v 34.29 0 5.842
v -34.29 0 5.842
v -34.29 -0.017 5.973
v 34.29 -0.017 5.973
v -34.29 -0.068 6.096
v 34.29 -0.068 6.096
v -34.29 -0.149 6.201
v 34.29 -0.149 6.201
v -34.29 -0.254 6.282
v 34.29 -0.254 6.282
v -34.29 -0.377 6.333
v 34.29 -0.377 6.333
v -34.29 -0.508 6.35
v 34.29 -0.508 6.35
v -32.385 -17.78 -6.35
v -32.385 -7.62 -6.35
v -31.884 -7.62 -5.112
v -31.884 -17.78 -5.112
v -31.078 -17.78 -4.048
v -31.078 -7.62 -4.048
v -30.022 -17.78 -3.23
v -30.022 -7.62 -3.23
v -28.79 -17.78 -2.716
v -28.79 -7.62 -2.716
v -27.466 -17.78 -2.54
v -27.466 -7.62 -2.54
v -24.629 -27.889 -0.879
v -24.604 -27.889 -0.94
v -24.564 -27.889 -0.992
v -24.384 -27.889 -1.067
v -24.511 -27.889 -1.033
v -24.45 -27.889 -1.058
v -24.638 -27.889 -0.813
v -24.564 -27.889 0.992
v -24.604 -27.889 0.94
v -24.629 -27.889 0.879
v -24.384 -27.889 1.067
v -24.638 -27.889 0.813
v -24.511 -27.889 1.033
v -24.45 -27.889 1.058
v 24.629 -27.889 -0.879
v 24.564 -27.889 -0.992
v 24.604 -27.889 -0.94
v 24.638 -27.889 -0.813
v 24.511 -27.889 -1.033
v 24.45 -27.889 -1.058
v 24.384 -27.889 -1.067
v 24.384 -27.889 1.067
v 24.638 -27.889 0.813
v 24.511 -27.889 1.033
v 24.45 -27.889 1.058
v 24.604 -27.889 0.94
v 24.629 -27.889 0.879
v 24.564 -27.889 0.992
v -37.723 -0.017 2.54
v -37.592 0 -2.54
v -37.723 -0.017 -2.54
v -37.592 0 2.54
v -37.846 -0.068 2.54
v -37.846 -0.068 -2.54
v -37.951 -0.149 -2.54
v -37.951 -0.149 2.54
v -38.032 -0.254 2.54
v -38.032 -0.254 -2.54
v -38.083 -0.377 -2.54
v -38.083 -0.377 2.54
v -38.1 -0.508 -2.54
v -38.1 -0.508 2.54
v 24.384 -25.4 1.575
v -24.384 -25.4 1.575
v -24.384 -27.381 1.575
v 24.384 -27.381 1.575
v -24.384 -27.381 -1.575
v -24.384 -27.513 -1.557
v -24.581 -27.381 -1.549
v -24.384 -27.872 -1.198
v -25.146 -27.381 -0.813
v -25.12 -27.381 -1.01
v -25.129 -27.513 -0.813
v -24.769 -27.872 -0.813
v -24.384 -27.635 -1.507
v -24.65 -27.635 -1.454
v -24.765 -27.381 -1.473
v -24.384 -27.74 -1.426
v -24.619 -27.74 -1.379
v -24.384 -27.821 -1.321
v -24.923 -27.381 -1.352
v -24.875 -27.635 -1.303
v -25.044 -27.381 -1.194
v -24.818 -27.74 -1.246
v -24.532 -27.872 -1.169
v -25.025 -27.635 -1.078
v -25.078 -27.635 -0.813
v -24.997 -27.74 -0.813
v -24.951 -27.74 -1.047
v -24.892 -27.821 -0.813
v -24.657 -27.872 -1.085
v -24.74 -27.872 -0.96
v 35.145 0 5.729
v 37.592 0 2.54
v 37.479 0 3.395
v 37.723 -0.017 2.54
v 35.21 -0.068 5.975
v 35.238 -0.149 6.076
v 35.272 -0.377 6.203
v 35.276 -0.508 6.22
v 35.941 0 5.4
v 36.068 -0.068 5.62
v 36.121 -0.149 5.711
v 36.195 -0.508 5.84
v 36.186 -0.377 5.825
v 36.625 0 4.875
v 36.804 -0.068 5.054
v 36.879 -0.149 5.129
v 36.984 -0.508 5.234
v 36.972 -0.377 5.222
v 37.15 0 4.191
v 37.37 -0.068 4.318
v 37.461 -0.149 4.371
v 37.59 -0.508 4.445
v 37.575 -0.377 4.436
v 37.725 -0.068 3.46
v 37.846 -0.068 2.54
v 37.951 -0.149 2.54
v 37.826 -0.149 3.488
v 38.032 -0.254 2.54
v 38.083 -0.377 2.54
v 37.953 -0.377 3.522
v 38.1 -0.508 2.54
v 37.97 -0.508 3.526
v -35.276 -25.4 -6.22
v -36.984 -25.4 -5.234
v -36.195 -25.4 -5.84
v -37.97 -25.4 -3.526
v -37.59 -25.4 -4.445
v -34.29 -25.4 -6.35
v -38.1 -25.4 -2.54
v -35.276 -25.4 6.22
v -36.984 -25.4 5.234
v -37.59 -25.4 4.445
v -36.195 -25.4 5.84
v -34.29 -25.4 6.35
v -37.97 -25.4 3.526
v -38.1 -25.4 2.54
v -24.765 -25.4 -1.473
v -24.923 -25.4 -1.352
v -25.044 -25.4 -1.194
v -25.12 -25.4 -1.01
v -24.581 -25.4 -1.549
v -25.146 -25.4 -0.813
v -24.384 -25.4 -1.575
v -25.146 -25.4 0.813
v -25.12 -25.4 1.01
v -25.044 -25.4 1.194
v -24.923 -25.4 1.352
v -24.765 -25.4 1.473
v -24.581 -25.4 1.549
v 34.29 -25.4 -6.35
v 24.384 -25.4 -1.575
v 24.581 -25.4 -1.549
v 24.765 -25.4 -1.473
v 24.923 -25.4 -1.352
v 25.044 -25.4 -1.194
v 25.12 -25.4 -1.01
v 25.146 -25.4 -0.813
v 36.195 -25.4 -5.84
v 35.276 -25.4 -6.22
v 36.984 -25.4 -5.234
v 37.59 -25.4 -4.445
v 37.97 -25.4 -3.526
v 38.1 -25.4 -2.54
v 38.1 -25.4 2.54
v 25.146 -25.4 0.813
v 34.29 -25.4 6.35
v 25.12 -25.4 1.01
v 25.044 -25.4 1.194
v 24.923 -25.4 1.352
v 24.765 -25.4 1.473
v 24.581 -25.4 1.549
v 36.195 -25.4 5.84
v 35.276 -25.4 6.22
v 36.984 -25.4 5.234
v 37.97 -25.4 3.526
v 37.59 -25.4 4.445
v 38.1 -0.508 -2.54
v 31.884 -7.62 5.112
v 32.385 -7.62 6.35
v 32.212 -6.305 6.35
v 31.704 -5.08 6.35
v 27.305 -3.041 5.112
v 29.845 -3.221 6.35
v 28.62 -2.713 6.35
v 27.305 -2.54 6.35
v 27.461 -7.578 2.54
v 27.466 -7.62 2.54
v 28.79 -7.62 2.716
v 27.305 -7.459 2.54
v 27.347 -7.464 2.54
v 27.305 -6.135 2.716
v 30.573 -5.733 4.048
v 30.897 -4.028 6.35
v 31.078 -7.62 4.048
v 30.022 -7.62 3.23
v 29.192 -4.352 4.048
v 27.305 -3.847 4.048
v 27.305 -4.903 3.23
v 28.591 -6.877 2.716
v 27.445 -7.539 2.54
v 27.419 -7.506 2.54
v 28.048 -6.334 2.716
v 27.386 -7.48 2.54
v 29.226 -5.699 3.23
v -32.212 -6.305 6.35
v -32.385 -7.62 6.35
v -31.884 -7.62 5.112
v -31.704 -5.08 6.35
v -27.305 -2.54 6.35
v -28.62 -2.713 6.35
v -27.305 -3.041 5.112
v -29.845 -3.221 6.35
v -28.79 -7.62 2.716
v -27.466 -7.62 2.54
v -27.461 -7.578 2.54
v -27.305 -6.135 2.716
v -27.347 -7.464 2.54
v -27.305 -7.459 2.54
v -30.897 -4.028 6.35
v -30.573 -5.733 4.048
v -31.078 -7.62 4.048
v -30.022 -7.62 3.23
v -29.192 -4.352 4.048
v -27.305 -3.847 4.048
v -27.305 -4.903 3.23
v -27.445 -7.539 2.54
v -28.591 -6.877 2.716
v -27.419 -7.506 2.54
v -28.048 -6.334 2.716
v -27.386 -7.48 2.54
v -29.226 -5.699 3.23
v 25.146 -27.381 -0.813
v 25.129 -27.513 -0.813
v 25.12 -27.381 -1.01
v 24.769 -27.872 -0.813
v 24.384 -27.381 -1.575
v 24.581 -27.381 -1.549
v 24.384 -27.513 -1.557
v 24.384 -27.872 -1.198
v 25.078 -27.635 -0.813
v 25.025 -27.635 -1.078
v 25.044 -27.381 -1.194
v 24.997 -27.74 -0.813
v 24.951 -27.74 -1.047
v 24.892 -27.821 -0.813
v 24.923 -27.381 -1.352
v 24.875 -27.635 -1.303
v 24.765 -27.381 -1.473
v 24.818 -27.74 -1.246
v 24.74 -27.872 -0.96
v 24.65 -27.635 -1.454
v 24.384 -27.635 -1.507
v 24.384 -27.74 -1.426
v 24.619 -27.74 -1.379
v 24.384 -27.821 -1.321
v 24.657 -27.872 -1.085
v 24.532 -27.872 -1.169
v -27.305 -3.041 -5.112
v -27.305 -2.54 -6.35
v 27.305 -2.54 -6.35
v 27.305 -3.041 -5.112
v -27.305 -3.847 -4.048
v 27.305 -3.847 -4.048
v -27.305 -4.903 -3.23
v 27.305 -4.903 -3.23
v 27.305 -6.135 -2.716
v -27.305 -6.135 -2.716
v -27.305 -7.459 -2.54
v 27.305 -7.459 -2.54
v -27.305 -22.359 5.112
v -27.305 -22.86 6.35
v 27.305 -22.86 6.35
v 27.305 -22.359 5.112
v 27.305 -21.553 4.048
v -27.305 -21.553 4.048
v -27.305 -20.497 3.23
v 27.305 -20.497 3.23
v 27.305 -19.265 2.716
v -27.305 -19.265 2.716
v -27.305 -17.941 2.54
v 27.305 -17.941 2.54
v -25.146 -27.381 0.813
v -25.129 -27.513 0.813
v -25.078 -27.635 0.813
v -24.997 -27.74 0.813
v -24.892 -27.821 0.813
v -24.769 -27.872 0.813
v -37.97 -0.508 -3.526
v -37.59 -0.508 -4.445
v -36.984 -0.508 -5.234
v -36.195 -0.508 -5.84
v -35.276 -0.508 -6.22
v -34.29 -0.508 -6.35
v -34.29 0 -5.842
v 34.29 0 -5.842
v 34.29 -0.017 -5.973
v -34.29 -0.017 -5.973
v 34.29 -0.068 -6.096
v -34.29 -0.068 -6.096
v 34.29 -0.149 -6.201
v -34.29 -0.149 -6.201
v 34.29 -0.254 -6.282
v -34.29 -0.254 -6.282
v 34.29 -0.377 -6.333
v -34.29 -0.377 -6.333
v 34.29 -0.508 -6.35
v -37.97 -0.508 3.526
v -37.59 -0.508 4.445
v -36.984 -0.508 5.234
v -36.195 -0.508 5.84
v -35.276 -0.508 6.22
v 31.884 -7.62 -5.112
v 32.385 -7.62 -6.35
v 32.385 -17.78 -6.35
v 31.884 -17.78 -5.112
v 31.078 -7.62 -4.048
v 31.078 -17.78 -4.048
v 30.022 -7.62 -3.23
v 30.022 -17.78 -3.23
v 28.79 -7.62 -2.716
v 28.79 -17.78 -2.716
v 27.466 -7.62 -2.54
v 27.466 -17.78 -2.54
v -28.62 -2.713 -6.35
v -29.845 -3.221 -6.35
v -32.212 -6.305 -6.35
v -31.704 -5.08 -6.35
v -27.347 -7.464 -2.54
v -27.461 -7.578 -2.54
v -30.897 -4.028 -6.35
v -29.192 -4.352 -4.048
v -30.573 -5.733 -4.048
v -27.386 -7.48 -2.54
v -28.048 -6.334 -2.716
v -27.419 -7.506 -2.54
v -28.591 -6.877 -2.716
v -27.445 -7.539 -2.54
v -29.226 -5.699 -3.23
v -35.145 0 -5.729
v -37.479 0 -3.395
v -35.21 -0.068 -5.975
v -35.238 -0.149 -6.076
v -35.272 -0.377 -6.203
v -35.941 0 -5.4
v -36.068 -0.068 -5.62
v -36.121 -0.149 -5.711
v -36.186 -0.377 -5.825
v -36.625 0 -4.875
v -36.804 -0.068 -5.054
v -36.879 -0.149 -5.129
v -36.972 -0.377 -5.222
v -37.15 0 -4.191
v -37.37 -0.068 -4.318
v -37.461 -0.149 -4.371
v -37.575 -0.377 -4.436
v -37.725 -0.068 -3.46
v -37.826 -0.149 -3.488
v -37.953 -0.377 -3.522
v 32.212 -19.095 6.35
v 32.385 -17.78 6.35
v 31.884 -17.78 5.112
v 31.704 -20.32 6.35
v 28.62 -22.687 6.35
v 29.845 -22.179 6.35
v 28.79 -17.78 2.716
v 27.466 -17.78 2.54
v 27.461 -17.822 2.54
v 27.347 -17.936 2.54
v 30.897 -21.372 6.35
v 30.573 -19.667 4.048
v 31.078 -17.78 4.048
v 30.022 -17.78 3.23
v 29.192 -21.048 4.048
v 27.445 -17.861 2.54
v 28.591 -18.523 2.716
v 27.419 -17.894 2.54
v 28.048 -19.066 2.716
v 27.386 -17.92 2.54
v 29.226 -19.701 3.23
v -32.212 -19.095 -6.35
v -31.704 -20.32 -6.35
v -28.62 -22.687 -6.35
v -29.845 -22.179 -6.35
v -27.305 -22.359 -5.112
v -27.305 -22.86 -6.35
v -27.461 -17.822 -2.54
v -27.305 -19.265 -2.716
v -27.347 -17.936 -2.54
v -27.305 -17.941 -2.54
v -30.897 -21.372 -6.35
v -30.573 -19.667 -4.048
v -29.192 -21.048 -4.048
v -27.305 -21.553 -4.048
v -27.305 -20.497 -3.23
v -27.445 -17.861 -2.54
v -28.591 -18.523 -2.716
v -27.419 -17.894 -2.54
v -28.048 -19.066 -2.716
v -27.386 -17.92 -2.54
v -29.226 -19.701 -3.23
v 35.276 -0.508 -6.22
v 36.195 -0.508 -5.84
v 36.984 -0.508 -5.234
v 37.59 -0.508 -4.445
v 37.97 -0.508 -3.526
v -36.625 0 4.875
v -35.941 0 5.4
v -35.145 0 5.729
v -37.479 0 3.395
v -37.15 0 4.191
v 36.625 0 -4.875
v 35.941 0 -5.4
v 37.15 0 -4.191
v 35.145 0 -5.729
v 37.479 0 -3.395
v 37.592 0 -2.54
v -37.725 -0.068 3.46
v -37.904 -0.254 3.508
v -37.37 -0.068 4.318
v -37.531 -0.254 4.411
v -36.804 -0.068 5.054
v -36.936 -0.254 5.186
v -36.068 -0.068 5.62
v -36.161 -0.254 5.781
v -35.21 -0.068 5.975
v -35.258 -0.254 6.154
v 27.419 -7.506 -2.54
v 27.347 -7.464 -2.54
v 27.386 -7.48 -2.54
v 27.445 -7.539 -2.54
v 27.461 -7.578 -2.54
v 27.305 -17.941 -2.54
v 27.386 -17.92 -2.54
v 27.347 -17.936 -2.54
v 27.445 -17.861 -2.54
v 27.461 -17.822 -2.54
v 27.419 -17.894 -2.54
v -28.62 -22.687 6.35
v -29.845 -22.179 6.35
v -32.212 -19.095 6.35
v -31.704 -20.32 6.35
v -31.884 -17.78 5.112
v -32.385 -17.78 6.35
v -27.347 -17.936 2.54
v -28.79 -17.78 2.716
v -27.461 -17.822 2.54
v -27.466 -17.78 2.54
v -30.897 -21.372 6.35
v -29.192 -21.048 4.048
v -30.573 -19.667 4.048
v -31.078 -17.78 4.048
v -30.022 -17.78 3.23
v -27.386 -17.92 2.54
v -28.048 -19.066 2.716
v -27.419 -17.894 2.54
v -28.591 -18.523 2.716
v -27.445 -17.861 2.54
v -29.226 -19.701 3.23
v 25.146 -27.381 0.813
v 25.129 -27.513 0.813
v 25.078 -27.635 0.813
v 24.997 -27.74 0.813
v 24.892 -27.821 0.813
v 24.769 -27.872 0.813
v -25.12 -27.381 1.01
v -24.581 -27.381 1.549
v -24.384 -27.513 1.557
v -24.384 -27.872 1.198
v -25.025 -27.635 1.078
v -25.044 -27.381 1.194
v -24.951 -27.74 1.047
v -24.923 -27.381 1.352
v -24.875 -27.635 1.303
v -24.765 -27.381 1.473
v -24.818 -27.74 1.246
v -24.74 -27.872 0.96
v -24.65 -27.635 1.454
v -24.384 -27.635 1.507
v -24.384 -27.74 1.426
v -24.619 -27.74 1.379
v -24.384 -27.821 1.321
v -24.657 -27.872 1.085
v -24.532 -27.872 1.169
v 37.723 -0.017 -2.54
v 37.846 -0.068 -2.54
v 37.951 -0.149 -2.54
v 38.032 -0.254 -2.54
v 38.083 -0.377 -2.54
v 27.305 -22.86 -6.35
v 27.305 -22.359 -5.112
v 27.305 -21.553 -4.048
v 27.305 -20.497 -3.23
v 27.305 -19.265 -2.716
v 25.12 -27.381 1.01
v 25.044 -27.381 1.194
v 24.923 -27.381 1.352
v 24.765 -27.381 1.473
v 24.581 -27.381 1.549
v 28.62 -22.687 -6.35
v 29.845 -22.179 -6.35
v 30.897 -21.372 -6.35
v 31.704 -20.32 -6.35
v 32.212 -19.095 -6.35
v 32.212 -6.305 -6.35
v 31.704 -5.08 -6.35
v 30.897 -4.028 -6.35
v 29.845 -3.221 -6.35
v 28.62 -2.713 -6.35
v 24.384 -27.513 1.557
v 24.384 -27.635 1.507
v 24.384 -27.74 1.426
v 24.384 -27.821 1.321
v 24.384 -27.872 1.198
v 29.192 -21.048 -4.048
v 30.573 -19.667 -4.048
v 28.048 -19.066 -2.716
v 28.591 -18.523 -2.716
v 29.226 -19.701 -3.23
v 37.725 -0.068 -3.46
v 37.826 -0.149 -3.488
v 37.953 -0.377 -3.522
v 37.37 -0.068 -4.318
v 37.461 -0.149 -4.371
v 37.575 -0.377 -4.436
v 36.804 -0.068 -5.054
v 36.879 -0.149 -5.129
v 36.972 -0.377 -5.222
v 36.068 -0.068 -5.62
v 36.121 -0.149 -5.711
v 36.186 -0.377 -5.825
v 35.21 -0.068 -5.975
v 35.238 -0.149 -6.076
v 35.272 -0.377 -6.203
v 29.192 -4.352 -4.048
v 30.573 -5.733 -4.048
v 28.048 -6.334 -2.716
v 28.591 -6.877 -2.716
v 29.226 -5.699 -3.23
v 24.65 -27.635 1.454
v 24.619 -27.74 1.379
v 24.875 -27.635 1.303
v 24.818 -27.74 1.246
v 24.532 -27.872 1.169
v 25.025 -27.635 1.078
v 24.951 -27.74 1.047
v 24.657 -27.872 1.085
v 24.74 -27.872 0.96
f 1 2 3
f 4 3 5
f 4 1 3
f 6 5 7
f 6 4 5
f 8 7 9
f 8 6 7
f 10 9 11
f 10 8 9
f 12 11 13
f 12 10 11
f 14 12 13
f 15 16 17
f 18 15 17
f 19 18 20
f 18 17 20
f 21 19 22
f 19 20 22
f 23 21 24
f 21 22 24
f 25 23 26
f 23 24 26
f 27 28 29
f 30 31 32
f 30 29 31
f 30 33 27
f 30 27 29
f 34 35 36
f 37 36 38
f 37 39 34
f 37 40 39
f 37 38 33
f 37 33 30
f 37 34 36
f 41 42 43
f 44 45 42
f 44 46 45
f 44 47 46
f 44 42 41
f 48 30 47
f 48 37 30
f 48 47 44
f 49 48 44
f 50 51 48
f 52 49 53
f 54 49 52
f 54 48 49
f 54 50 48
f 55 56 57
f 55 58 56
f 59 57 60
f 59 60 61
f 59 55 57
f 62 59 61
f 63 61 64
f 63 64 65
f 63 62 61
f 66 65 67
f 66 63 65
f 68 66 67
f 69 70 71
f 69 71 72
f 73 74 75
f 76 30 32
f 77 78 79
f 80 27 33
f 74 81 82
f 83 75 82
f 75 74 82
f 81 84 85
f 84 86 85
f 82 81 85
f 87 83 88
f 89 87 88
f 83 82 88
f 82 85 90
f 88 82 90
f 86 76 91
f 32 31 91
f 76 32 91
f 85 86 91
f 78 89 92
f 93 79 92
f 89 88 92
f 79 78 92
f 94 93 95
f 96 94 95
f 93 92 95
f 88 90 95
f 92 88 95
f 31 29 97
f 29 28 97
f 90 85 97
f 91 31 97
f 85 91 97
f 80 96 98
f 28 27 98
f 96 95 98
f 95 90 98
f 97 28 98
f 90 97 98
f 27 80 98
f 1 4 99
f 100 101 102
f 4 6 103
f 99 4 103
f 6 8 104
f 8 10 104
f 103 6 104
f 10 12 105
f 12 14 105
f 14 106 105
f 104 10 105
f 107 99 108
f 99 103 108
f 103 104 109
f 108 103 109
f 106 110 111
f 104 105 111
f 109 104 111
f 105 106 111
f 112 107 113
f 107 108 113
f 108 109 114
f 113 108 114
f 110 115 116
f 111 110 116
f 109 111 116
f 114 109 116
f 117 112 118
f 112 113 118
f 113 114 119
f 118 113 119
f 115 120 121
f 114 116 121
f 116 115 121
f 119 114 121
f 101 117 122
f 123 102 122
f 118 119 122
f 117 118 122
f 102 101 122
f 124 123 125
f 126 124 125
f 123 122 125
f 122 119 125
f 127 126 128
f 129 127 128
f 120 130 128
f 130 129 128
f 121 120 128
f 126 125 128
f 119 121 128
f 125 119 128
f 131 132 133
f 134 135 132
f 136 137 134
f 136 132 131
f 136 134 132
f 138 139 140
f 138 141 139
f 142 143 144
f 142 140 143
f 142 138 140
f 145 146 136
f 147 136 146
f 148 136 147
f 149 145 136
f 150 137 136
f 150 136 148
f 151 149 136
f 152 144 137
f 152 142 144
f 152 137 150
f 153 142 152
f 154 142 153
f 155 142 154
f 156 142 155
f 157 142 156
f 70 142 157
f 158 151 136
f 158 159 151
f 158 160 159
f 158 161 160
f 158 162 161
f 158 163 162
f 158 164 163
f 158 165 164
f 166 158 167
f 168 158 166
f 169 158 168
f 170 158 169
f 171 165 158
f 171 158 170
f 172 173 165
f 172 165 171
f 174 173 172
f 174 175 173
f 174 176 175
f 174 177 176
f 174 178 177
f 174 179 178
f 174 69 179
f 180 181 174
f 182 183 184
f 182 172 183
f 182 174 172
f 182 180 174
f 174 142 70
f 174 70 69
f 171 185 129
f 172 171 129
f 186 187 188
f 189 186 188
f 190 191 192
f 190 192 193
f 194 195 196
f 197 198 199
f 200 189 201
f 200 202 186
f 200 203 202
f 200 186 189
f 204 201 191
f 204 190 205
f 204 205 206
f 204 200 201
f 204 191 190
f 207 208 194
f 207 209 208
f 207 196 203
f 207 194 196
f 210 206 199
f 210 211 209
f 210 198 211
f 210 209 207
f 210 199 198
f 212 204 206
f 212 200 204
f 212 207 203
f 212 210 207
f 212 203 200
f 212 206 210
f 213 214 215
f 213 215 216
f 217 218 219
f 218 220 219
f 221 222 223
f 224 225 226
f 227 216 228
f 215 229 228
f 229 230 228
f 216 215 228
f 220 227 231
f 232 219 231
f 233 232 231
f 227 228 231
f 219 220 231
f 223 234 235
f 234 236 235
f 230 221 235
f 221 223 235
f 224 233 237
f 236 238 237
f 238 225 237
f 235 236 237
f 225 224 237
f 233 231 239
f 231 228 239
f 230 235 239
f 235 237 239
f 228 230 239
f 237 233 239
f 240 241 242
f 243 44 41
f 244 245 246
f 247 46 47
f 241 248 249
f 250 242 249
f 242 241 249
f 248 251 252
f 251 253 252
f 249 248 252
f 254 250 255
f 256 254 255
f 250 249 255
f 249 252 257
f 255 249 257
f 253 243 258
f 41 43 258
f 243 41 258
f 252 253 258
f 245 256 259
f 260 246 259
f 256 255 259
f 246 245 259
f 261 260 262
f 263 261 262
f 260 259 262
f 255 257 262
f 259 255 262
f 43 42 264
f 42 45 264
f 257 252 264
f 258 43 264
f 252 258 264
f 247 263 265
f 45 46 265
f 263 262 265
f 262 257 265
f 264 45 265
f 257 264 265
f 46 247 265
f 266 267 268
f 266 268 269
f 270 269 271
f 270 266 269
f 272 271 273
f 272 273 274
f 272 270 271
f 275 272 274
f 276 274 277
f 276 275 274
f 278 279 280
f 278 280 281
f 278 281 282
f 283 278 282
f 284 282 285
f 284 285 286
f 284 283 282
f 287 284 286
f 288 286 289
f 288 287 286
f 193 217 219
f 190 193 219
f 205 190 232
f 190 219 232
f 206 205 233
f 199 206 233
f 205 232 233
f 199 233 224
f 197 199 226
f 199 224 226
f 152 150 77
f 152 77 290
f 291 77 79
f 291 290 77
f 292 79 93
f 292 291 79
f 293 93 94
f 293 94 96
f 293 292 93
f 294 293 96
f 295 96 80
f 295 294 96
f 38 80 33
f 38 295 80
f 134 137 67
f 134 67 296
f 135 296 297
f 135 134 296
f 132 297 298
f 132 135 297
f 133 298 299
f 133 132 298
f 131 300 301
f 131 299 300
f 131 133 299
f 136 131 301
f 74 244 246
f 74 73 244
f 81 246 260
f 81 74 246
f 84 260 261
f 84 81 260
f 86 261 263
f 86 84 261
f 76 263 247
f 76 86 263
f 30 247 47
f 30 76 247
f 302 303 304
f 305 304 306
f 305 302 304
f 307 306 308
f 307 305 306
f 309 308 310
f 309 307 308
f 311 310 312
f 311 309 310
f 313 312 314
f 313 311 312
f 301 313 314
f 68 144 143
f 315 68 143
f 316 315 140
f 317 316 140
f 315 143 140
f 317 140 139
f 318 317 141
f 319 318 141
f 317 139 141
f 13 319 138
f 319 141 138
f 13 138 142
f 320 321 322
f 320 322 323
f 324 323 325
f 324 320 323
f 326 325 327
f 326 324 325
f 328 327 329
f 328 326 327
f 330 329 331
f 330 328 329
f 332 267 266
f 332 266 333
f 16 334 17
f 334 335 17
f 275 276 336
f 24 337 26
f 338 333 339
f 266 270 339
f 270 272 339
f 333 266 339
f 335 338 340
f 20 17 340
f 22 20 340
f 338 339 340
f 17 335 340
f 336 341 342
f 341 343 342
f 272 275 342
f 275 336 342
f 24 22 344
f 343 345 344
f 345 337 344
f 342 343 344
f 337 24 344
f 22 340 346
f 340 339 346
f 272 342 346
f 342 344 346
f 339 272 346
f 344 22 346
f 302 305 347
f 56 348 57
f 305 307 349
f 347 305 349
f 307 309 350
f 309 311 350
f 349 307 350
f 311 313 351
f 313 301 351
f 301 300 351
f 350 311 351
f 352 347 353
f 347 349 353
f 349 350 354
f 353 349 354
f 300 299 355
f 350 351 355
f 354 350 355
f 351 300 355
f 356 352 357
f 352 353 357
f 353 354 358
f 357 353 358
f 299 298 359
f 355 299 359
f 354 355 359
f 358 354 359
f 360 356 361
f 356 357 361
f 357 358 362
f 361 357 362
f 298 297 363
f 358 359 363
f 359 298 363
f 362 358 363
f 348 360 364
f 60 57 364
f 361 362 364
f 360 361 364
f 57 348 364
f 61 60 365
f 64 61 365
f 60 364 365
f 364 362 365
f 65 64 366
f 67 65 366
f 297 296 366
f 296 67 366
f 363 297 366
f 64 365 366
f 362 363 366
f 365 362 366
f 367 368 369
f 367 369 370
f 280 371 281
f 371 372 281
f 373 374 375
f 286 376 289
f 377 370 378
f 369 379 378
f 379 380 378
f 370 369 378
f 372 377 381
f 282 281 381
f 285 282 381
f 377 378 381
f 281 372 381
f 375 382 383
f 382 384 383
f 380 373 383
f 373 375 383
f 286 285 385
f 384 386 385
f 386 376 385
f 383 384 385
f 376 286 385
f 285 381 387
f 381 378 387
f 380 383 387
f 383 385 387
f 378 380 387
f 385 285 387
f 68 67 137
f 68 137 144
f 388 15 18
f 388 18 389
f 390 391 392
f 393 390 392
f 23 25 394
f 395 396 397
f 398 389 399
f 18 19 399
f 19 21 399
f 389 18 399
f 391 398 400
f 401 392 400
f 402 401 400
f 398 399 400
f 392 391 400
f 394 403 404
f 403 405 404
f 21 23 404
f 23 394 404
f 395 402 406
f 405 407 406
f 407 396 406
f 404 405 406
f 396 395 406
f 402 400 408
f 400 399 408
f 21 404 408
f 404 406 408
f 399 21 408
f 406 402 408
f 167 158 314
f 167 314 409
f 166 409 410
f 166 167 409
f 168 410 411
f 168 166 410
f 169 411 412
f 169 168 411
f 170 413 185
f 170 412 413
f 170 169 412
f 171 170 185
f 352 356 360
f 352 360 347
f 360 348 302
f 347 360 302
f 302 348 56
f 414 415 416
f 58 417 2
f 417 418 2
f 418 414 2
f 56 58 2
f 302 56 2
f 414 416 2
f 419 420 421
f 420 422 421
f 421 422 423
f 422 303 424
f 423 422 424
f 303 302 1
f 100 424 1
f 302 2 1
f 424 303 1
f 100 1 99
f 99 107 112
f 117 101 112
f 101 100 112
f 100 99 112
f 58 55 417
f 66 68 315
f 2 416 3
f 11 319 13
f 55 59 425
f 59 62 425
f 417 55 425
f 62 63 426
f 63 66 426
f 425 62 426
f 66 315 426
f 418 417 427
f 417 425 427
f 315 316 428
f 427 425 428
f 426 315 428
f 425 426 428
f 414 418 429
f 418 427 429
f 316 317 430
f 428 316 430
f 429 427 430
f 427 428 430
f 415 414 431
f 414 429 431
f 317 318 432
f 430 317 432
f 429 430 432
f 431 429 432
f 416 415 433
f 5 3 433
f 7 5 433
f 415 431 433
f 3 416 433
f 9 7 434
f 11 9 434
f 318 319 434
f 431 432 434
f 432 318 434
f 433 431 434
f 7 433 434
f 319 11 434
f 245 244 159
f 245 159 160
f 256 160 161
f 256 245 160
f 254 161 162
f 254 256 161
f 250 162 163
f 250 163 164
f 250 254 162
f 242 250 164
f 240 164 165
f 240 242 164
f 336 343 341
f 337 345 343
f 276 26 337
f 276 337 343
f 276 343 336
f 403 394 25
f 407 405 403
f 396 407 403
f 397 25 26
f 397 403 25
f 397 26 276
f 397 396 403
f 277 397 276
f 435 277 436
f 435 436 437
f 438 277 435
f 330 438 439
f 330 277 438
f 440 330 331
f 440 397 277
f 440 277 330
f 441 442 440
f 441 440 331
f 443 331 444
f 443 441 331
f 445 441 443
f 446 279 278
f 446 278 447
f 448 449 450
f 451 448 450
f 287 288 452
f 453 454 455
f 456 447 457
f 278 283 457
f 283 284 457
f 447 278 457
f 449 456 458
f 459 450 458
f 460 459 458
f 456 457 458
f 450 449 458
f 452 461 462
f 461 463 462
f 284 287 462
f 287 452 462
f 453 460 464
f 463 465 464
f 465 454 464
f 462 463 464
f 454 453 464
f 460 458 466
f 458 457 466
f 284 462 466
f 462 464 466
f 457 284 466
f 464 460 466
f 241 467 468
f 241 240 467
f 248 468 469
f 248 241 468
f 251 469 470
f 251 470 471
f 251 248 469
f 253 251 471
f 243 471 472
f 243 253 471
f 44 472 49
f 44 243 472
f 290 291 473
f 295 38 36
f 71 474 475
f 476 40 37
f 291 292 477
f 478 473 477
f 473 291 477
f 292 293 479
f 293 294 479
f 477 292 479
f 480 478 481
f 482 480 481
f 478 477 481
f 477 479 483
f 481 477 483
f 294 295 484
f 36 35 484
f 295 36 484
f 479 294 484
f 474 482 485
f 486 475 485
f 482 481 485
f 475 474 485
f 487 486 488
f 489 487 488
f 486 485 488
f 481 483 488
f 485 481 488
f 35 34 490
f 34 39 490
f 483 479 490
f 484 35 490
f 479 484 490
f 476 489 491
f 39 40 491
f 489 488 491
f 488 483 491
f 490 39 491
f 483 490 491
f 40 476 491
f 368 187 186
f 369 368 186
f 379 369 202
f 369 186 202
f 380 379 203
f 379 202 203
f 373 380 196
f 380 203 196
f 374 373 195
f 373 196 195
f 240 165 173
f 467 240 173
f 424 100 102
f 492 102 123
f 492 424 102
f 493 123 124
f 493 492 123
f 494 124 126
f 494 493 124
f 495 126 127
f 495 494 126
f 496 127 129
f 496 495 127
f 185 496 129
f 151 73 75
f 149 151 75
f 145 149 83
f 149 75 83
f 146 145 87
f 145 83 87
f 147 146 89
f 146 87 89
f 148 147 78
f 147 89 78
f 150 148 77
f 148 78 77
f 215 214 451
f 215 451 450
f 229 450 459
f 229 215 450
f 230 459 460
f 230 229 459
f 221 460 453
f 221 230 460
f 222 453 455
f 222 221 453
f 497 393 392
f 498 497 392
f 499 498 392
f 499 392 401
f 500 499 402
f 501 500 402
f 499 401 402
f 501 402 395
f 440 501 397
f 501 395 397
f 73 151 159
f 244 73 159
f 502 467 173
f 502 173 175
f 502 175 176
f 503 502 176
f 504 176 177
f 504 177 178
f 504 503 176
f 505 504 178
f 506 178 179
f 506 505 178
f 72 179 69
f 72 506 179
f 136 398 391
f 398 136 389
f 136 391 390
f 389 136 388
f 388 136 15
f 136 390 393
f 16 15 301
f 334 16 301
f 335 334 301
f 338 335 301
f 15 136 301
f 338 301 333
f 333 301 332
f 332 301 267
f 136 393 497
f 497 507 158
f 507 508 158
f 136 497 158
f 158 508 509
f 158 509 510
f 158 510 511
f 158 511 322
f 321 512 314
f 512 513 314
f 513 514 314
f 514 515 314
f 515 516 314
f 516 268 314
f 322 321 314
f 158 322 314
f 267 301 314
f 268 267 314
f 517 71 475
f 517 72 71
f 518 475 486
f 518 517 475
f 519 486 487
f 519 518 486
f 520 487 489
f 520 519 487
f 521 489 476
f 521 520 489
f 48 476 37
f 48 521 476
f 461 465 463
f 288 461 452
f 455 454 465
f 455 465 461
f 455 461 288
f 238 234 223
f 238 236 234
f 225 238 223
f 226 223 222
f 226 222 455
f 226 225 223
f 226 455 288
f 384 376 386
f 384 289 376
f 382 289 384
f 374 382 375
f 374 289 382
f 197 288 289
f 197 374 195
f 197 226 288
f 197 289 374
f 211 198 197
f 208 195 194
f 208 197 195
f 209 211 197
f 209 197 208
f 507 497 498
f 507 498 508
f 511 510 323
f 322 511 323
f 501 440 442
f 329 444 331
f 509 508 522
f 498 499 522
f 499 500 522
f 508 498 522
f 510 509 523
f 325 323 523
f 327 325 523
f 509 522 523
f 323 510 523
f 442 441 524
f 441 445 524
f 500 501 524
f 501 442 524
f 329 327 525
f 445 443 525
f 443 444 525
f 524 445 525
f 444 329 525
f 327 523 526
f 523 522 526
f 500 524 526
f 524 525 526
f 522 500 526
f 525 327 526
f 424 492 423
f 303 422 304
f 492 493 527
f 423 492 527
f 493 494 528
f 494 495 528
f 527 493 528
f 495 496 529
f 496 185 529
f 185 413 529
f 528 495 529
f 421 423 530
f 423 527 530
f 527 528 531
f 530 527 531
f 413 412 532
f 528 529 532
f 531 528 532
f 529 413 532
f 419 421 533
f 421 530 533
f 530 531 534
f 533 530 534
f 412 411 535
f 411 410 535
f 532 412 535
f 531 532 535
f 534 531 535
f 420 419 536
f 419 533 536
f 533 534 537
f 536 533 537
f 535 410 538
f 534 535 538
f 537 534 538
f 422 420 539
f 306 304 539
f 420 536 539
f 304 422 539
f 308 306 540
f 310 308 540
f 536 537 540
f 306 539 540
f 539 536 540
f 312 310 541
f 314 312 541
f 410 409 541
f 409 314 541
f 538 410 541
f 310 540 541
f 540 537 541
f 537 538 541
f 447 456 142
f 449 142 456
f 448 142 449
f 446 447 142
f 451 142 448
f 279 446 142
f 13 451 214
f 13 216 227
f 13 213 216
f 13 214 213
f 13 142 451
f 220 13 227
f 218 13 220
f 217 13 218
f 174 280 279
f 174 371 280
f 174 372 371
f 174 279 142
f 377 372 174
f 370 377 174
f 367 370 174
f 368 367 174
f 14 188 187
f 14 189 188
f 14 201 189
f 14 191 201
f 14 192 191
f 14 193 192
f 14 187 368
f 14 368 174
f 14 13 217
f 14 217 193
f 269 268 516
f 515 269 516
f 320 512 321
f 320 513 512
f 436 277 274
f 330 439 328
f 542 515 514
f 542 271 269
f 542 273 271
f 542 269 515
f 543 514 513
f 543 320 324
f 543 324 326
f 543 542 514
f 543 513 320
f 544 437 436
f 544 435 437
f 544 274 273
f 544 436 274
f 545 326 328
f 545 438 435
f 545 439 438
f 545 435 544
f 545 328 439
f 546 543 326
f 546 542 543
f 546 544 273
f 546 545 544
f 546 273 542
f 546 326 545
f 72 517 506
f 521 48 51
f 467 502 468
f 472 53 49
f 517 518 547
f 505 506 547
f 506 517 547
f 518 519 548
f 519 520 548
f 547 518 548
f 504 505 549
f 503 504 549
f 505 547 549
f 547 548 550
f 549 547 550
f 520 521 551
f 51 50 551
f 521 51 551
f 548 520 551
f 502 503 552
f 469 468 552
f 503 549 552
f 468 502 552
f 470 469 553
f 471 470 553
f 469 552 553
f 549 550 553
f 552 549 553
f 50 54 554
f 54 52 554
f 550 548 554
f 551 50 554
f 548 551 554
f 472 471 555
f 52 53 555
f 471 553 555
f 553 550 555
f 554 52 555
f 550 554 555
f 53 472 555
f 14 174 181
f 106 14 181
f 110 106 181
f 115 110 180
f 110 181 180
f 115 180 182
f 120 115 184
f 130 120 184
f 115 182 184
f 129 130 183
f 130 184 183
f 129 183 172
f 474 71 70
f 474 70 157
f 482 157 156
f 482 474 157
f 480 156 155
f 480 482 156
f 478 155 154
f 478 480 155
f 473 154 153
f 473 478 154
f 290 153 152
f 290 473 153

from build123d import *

# Parameters (mm, degrees)
F0_W          = 76.2
F0_H          = 12.7
F1_DEPTH      = 25.4
F2_W          = 50.292
F2_H          = 3.1496
F3_DEPTH      = 2.4892
F4_R          = 0.762
F5_R          = 0.508
F6_R          = 3.81
F7_W          = 64.77
F7_H          = 20.32
F8_DEPTH      = 3.81
F9_R          = 5.08
F10_T1_DEPTH  = 54.61
F10_T3_DEPTH  = 10.16
F10_T6_ANGLE  = 90
F10_T8_ANGLE  = 90
F10_T10_ANGLE = 90
F10_T12_ANGLE = 90
F11_W         = 64.77
F11_H         = 20.32
F12_DEPTH     = 3.81
F13_R         = 5.08
F14_T1_DEPTH  = 54.61
F14_T3_DEPTH  = 10.16
F14_T6_ANGLE  = 90
F14_T8_ANGLE  = 90
F14_T10_ANGLE = 90
F14_T12_ANGLE = 90
F15_R         = 0.508


# Not quite as in the source:
# - a fillet or chamfer that OpenCascade refuses, or shapes differently, is made with other operations: its cross-section is extruded or revolved along the edge and cut away or added


with BuildPart() as f1:
    # F0 (on Front) → F1 (new body)
    with BuildSketch(Plane.XZ):
        Rectangle(F0_W, F0_H)
    extrude(amount=F1_DEPTH)

    # F2 (on face) → F3 (join)
    with BuildSketch(Plane.XZ.offset(25.4)):
        Rectangle(F2_W, F2_H)
    extrude(amount=F3_DEPTH)

    # F4
    f4_edges = [f1.edges().sort_by_distance(p)[0] for p in [
        (-25.146, -26.6446, 1.5748),
        (-25.146, -26.6446, -1.5748),
        (25.146, -26.6446, 1.5748),
        (25.146, -26.6446, -1.5748),
    ]]
    fillet(f4_edges, radius=F4_R)

    # F5
    f5_edges = [f1.edges().sort_by_distance(p)[0] for p in [
        (0, -27.8892, 1.5748),
        (24.922815, -27.8892, 1.351615),
        (-24.922815, -27.8892, 1.351615),
        (25.146, -27.8892, 0),
        (-25.146, -27.8892, 0),
        (24.922815, -27.8892, -1.351615),
        (-24.922815, -27.8892, -1.351615),
        (0, -27.8892, -1.5748),
    ]]
    fillet(f5_edges, radius=F5_R)

    # F6
    f6_edges = [f1.edges().sort_by_distance(p)[0] for p in [
        (38.1, -12.7, 6.35),
        (38.1, -12.7, -6.35),
        (-38.1, -12.7, 6.35),
        (-38.1, -12.7, -6.35),
    ]]
    fillet(f6_edges, radius=F6_R)

    # F7 (on face) → F8 (cut)
    with BuildSketch(Plane.XY.offset(6.35)):
        with Locations((0, -12.7)):
            Rectangle(F7_W, F7_H)
    extrude(amount=-F8_DEPTH, mode=Mode.SUBTRACT)

    # F9
    f9_edges = [f1.edges().sort_by_distance(p)[0] for p in [
        (-32.385, -2.54, 4.445),
        (-32.385, -22.86, 4.445),
        (32.385, -2.54, 4.445),
        (32.385, -22.86, 4.445),
    ]]
    fillet(f9_edges, radius=F9_R)

    # F10: fillet of radius 5.08 on 1 edges, made by hand

    # F10_s2 → F10_t1 (join)
    with BuildSketch(Plane.YZ.offset(-27.305)):
        with BuildLine():
            ThreePointArc((-2.54, 6.35), (-4.3478368763, 3.6039073716), (-7.4586888497, 2.54))
            Line((-7.4586888497, 2.54), (-2.54, 2.54))
            Line((-2.54, 2.54), (-2.54, 6.35))
        make_face()
        with BuildLine():
            ThreePointArc((-22.86, 6.35), (-21.0521631237, 3.6039073716), (-17.9413111503, 2.54))
            Line((-17.9413111503, 2.54), (-22.86, 2.54))
            Line((-22.86, 2.54), (-22.86, 6.35))
        make_face()
    extrude(amount=F10_T1_DEPTH)

    # F10_s4 → F10_t3 (join)
    with BuildSketch(Plane.XZ.offset(7.62)):
        with BuildLine():
            ThreePointArc((-32.385, 6.35), (-30.5771631237, 3.6039073716), (-27.4663111503, 2.54))
            Line((-27.4663111503, 2.54), (-32.385, 2.54))
            Line((-32.385, 2.54), (-32.385, 6.35))
        make_face()
        with BuildLine():
            ThreePointArc((32.385, 6.35), (30.5771631237, 3.6039073716), (27.4663111503, 2.54))
            Line((27.4663111503, 2.54), (32.385, 2.54))
            Line((32.385, 2.54), (32.385, 6.35))
        make_face()
    extrude(amount=F10_T3_DEPTH)

    # F10_s5 → F10_t6 (revolve)
    with BuildSketch(Plane.XZ.offset(7.62)):
        with BuildLine():
            ThreePointArc((32.385, 6.35), (30.5771631237, 3.6039073716), (27.4663111503, 2.54))
            Line((27.4663111503, 2.54), (32.385, 2.54))
            Line((32.385, 2.54), (32.385, 6.35))
        make_face()
    revolve(axis=Axis((27.305, -7.62, 2.54), (0, 0, 1)), revolution_arc=F10_T6_ANGLE)

    # F10_s7 → F10_t8 (revolve)
    with BuildSketch(Plane.XZ.offset(7.62)):
        with BuildLine():
            ThreePointArc((-32.385, 6.35), (-30.5771631237, 3.6039073716), (-27.4663111503, 2.54))
            Line((-27.4663111503, 2.54), (-32.385, 2.54))
            Line((-32.385, 2.54), (-32.385, 6.35))
        make_face()
    revolve(axis=Axis((-27.305, -7.62, 2.54), (0, 0, -1)), revolution_arc=F10_T8_ANGLE)

    # F10_s9 → F10_t10 (revolve)
    with BuildSketch(Plane.YZ.offset(-27.305)):
        with BuildLine():
            ThreePointArc((-22.86, 6.35), (-21.0521631237, 3.6039073716), (-17.9413111503, 2.54))
            Line((-17.9413111503, 2.54), (-22.86, 2.54))
            Line((-22.86, 2.54), (-22.86, 6.35))
        make_face()
    revolve(axis=Axis((-27.305, -17.78, 2.54), (0, 0, -1)), revolution_arc=F10_T10_ANGLE)

    # F10_s11 → F10_t12 (revolve)
    with BuildSketch(Plane.XZ.offset(17.78)):
        with BuildLine():
            ThreePointArc((32.385, 6.35), (30.5771631237, 3.6039073716), (27.4663111503, 2.54))
            Line((27.4663111503, 2.54), (32.385, 2.54))
            Line((32.385, 2.54), (32.385, 6.35))
        make_face()
    revolve(axis=Axis((27.305, -17.78, 2.54), (0, 0, -1)), revolution_arc=F10_T12_ANGLE)

    # F11 (on face) → F12 (cut)
    with BuildSketch(Plane(origin=(0, 0, -6.35), x_dir=(1, 0, 0), z_dir=(0, 0, -1))):
        with Locations((0, 12.7)):
            Rectangle(F11_W, F11_H)
    extrude(amount=-F12_DEPTH, mode=Mode.SUBTRACT)

    # F13
    f13_edges = [f1.edges().sort_by_distance(p)[0] for p in [
        (32.385, -22.86, -4.445),
        (32.385, -2.54, -4.445),
        (-32.385, -22.86, -4.445),
        (-32.385, -2.54, -4.445),
    ]]
    fillet(f13_edges, radius=F13_R)

    # F14: fillet of radius 5.08 on 1 edges, made by hand

    # F14_s2 → F14_t1 (join)
    with BuildSketch(Plane.YZ.offset(-27.305)):
        with BuildLine():
            ThreePointArc((-22.86, -6.35), (-21.0521631237, -3.6039073716), (-17.9413111503, -2.54))
            Line((-17.9413111503, -2.54), (-22.86, -2.54))
            Line((-22.86, -2.54), (-22.86, -6.35))
        make_face()
        with BuildLine():
            ThreePointArc((-2.54, -6.35), (-4.3478368763, -3.6039073716), (-7.4586888497, -2.54))
            Line((-7.4586888497, -2.54), (-2.54, -2.54))
            Line((-2.54, -2.54), (-2.54, -6.35))
        make_face()
    extrude(amount=F14_T1_DEPTH)

    # F14_s4 → F14_t3 (join)
    with BuildSketch(Plane.XZ.offset(7.62)):
        with BuildLine():
            ThreePointArc((32.385, -6.35), (30.5771631237, -3.6039073716), (27.4663111503, -2.54))
            Line((27.4663111503, -2.54), (32.385, -2.54))
            Line((32.385, -2.54), (32.385, -6.35))
        make_face()
        with BuildLine():
            ThreePointArc((-32.385, -6.35), (-30.5771631237, -3.6039073716), (-27.4663111503, -2.54))
            Line((-27.4663111503, -2.54), (-32.385, -2.54))
            Line((-32.385, -2.54), (-32.385, -6.35))
        make_face()
    extrude(amount=F14_T3_DEPTH)

    # F14_s5 → F14_t6 (revolve)
    with BuildSketch(Plane.YZ.offset(27.305)):
        with BuildLine():
            ThreePointArc((-22.86, -6.35), (-21.0521631237, -3.6039073716), (-17.9413111503, -2.54))
            Line((-17.9413111503, -2.54), (-22.86, -2.54))
            Line((-22.86, -2.54), (-22.86, -6.35))
        make_face()
    revolve(axis=Axis((27.305, -17.78, -2.54), (0, 0, 1)), revolution_arc=F14_T6_ANGLE)

    # F14_s7 → F14_t8 (revolve)
    with BuildSketch(Plane.YZ.offset(27.305)):
        with BuildLine():
            ThreePointArc((-2.54, -6.35), (-4.3478368763, -3.6039073716), (-7.4586888497, -2.54))
            Line((-7.4586888497, -2.54), (-2.54, -2.54))
            Line((-2.54, -2.54), (-2.54, -6.35))
        make_face()
    revolve(axis=Axis((27.305, -7.62, -2.54), (0, 0, -1)), revolution_arc=F14_T8_ANGLE)

    # F14_s9 → F14_t10 (revolve)
    with BuildSketch(Plane.YZ.offset(-27.305)):
        with BuildLine():
            ThreePointArc((-2.54, -6.35), (-4.3478368763, -3.6039073716), (-7.4586888497, -2.54))
            Line((-7.4586888497, -2.54), (-2.54, -2.54))
            Line((-2.54, -2.54), (-2.54, -6.35))
        make_face()
    revolve(axis=Axis((-27.305, -7.62, -2.54), (0, 0, 1)), revolution_arc=F14_T10_ANGLE)

    # F14_s11 → F14_t12 (revolve)
    with BuildSketch(Plane.XZ.offset(17.78)):
        with BuildLine():
            ThreePointArc((-32.385, -6.35), (-30.5771631237, -3.6039073716), (-27.4663111503, -2.54))
            Line((-27.4663111503, -2.54), (-32.385, -2.54))
            Line((-32.385, -2.54), (-32.385, -6.35))
        make_face()
    revolve(axis=Axis((-27.305, -17.78, -2.54), (0, 0, 1)), revolution_arc=F14_T12_ANGLE)

    # F15
    f15_edges = [f1.edges().sort_by_distance(p)[0] for p in [
        (-36.984077, 0, 5.234077),
        (0, 0, -6.35),
        (0, 0, 6.35),
        (36.984077, 0, 5.234077),
        (38.1, 0, 0),
        (-38.1, 0, 0),
        (36.984077, 0, -5.234077),
        (-36.984077, 0, -5.234077),
    ]]
    fillet(f15_edges, radius=F15_R)


solid = f1.part
